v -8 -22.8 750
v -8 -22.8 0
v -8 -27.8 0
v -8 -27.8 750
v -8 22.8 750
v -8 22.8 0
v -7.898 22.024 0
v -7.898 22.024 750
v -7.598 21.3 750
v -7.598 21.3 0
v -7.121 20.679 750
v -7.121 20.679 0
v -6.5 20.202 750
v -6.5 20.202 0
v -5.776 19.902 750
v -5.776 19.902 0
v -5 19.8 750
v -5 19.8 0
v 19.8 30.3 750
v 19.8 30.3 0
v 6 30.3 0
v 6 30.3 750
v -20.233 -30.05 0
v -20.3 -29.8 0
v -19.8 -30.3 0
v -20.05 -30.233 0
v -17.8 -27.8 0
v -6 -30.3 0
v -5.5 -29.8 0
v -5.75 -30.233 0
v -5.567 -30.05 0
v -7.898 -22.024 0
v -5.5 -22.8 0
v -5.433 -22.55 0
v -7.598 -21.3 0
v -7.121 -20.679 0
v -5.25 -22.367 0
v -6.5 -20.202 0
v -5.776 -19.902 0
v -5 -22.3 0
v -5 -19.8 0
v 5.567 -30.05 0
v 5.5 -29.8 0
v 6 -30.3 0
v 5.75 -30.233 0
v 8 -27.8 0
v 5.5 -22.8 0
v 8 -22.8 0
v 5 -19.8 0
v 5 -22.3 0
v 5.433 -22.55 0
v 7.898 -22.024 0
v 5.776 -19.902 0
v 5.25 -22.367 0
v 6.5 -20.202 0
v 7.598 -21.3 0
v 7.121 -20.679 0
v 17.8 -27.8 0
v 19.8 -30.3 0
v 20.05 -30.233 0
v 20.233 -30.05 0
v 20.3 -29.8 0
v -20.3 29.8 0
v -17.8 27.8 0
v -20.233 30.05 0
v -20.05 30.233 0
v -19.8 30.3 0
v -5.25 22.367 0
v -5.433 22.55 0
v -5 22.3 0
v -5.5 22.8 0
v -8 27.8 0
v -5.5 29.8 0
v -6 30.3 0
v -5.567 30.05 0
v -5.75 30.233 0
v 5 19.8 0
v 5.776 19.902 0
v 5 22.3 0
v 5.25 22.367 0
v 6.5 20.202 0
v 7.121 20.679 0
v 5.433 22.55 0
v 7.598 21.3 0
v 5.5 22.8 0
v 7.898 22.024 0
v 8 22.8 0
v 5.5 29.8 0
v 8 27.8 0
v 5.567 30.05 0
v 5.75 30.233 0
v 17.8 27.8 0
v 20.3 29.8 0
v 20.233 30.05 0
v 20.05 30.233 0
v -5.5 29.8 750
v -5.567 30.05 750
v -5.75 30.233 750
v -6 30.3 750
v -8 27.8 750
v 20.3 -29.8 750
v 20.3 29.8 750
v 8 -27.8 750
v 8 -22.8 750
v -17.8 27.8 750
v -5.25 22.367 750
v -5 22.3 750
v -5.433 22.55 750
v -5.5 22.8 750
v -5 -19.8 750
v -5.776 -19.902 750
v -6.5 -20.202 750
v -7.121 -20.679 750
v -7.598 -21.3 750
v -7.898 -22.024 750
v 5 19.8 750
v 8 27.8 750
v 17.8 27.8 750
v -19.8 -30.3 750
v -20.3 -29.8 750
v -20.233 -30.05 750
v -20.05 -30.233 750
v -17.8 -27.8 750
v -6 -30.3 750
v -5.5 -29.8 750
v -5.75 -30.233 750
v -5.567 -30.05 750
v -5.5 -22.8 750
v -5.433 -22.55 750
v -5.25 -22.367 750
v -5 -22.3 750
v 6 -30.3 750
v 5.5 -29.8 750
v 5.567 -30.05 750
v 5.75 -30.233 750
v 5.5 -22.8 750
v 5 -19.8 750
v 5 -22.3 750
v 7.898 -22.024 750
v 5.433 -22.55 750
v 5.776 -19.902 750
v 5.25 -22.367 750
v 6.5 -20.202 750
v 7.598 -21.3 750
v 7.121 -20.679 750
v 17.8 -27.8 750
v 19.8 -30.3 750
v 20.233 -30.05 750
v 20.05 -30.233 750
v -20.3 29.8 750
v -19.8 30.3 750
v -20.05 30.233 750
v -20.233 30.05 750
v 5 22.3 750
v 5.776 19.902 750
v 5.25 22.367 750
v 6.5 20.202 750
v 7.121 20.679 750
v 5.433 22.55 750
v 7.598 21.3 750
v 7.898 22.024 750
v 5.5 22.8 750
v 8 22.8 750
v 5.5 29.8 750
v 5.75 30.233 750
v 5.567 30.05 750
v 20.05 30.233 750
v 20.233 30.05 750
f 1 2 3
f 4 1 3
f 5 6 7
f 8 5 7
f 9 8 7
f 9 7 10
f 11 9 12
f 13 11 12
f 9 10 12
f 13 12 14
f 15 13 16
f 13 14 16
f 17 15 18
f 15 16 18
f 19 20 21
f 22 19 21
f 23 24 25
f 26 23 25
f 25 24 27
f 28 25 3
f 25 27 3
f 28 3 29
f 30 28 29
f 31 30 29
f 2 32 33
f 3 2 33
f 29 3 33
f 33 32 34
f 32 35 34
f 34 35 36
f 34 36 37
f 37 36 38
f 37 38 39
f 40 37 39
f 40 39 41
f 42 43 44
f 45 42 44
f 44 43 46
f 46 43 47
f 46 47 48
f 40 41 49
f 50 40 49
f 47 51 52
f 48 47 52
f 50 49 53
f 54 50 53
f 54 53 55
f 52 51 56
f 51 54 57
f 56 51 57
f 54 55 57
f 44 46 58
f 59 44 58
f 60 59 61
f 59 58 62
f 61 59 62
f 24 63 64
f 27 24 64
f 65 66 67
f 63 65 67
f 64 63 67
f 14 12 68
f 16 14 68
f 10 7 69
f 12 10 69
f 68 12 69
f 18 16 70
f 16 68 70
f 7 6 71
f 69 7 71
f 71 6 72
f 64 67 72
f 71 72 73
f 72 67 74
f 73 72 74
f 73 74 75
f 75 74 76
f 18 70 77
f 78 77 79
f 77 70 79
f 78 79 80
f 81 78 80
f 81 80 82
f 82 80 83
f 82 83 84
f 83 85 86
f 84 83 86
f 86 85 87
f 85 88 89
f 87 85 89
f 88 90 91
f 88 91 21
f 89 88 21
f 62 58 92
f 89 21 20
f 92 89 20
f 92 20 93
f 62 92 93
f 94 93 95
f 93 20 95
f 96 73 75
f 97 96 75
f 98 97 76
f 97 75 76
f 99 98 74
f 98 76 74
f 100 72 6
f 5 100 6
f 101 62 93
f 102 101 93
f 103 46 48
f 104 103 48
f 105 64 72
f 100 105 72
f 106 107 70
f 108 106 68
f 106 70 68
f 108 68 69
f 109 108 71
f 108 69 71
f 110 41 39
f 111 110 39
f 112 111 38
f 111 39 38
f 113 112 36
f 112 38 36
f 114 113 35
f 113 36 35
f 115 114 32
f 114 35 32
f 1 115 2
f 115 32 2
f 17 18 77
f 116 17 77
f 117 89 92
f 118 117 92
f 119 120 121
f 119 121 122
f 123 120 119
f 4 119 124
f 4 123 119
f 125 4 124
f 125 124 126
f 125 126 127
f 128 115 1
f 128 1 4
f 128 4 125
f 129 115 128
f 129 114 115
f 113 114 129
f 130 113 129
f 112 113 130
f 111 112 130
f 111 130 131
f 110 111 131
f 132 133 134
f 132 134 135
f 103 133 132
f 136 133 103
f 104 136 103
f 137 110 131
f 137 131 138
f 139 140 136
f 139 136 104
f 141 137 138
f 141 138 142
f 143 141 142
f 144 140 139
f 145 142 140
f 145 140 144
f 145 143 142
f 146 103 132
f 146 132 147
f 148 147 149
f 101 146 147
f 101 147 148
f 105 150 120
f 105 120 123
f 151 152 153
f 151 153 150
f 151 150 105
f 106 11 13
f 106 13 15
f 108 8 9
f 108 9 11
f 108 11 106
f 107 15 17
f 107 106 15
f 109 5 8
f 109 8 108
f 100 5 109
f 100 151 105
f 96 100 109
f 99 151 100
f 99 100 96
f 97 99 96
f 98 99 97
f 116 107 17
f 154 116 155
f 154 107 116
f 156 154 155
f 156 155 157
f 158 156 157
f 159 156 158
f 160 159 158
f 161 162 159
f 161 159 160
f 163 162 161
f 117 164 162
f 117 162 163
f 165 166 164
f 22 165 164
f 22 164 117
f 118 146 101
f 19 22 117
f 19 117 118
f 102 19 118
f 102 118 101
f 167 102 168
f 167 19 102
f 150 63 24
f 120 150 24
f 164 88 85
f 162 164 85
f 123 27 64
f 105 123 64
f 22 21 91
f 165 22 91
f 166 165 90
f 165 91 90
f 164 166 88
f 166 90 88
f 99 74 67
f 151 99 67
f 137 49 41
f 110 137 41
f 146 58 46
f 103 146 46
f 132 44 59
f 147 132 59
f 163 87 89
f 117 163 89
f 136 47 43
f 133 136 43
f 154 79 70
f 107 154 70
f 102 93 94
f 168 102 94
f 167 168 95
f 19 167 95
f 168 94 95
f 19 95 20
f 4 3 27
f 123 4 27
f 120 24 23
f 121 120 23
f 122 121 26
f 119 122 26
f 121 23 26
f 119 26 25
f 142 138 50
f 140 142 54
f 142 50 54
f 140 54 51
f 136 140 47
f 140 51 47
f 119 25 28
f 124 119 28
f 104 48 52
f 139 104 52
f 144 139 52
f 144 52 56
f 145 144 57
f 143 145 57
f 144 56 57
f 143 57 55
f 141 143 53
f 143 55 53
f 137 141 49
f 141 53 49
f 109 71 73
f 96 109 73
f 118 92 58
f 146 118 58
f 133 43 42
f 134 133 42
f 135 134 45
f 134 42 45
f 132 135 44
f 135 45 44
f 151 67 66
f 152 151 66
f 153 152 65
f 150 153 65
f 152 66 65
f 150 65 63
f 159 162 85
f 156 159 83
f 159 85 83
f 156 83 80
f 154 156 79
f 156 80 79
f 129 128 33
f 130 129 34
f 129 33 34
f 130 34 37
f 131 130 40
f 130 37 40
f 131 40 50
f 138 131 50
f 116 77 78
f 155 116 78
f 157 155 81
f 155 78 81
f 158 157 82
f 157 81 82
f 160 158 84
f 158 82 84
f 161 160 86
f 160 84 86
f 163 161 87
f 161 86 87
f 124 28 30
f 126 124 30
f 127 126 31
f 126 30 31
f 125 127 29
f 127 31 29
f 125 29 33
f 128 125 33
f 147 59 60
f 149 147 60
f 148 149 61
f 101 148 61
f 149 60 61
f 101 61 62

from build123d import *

# Parameters (mm, degrees)
F2_DEPTH = 750


with BuildPart() as f2:
    # F1 (on face) → F2 (new body)
    with BuildSketch(Plane.XY):
        with BuildLine():
            ThreePointArc((19.8, -30.3), (20.153553, -30.153553), (20.3, -29.8))
            Line((20.3, -29.8), (20.3, 29.8))
            ThreePointArc((20.3, 29.8), (20.153553, 30.153553), (19.8, 30.3))
            Line((19.8, 30.3), (6, 30.3))
            ThreePointArc((6, 30.3), (5.646447, 30.153553), (5.5, 29.8))
            Line((5.5, 29.8), (5.5, 22.8))
            ThreePointArc((5.5, 22.8), (5.353553, 22.446447), (5, 22.3))
            Line((5, 22.3), (-5, 22.3))
            ThreePointArc((-5, 22.3), (-5.353553, 22.446447), (-5.5, 22.8))
            Line((-5.5, 22.8), (-5.5, 29.8))
            ThreePointArc((-5.5, 29.8), (-5.646447, 30.153553), (-6, 30.3))
            Line((-6, 30.3), (-19.8, 30.3))
            ThreePointArc((-19.8, 30.3), (-20.153553, 30.153553), (-20.3, 29.8))
            Line((-20.3, 29.8), (-20.3, -29.8))
            ThreePointArc((-20.3, -29.8), (-20.153553, -30.153553), (-19.8, -30.3))
            Line((-19.8, -30.3), (-6, -30.3))
            ThreePointArc((-6, -30.3), (-5.646447, -30.153553), (-5.5, -29.8))
            Line((-5.5, -29.8), (-5.5, -22.8))
            ThreePointArc((-5.5, -22.8), (-5.353553, -22.446447), (-5, -22.3))
            Line((-5, -22.3), (5, -22.3))
            ThreePointArc((5, -22.3), (5.353553, -22.446447), (5.5, -22.8))
            Line((5.5, -22.8), (5.5, -29.8))
            ThreePointArc((5.5, -29.8), (5.646447, -30.153553), (6, -30.3))
            Line((6, -30.3), (19.8, -30.3))
        make_face()
        with BuildLine():
            Line((5, -19.8), (-5, -19.8))
            ThreePointArc((-5, -19.8), (-7.12132, -20.67868), (-8, -22.8))
            Line((-8, -22.8), (-8, -27.8))
            Line((-8, -27.8), (-17.8, -27.8))
            Line((-17.8, -27.8), (-17.8, 27.8))
            Line((-17.8, 27.8), (-8, 27.8))
            Line((-8, 27.8), (-8, 22.8))
            ThreePointArc((-8, 22.8), (-7.12132, 20.67868), (-5, 19.8))
            Line((-5, 19.8), (5, 19.8))
            ThreePointArc((5, 19.8), (7.12132, 20.67868), (8, 22.8))
            Line((8, 22.8), (8, 27.8))
            Line((8, 27.8), (17.8, 27.8))
            Line((17.8, 27.8), (17.8, -27.8))
            Line((17.8, -27.8), (8, -27.8))
            Line((8, -27.8), (8, -22.8))
            ThreePointArc((8, -22.8), (7.12132, -20.67868), (5, -19.8))
        make_face(mode=Mode.SUBTRACT)
    extrude(amount=F2_DEPTH)


solid = f2.part
